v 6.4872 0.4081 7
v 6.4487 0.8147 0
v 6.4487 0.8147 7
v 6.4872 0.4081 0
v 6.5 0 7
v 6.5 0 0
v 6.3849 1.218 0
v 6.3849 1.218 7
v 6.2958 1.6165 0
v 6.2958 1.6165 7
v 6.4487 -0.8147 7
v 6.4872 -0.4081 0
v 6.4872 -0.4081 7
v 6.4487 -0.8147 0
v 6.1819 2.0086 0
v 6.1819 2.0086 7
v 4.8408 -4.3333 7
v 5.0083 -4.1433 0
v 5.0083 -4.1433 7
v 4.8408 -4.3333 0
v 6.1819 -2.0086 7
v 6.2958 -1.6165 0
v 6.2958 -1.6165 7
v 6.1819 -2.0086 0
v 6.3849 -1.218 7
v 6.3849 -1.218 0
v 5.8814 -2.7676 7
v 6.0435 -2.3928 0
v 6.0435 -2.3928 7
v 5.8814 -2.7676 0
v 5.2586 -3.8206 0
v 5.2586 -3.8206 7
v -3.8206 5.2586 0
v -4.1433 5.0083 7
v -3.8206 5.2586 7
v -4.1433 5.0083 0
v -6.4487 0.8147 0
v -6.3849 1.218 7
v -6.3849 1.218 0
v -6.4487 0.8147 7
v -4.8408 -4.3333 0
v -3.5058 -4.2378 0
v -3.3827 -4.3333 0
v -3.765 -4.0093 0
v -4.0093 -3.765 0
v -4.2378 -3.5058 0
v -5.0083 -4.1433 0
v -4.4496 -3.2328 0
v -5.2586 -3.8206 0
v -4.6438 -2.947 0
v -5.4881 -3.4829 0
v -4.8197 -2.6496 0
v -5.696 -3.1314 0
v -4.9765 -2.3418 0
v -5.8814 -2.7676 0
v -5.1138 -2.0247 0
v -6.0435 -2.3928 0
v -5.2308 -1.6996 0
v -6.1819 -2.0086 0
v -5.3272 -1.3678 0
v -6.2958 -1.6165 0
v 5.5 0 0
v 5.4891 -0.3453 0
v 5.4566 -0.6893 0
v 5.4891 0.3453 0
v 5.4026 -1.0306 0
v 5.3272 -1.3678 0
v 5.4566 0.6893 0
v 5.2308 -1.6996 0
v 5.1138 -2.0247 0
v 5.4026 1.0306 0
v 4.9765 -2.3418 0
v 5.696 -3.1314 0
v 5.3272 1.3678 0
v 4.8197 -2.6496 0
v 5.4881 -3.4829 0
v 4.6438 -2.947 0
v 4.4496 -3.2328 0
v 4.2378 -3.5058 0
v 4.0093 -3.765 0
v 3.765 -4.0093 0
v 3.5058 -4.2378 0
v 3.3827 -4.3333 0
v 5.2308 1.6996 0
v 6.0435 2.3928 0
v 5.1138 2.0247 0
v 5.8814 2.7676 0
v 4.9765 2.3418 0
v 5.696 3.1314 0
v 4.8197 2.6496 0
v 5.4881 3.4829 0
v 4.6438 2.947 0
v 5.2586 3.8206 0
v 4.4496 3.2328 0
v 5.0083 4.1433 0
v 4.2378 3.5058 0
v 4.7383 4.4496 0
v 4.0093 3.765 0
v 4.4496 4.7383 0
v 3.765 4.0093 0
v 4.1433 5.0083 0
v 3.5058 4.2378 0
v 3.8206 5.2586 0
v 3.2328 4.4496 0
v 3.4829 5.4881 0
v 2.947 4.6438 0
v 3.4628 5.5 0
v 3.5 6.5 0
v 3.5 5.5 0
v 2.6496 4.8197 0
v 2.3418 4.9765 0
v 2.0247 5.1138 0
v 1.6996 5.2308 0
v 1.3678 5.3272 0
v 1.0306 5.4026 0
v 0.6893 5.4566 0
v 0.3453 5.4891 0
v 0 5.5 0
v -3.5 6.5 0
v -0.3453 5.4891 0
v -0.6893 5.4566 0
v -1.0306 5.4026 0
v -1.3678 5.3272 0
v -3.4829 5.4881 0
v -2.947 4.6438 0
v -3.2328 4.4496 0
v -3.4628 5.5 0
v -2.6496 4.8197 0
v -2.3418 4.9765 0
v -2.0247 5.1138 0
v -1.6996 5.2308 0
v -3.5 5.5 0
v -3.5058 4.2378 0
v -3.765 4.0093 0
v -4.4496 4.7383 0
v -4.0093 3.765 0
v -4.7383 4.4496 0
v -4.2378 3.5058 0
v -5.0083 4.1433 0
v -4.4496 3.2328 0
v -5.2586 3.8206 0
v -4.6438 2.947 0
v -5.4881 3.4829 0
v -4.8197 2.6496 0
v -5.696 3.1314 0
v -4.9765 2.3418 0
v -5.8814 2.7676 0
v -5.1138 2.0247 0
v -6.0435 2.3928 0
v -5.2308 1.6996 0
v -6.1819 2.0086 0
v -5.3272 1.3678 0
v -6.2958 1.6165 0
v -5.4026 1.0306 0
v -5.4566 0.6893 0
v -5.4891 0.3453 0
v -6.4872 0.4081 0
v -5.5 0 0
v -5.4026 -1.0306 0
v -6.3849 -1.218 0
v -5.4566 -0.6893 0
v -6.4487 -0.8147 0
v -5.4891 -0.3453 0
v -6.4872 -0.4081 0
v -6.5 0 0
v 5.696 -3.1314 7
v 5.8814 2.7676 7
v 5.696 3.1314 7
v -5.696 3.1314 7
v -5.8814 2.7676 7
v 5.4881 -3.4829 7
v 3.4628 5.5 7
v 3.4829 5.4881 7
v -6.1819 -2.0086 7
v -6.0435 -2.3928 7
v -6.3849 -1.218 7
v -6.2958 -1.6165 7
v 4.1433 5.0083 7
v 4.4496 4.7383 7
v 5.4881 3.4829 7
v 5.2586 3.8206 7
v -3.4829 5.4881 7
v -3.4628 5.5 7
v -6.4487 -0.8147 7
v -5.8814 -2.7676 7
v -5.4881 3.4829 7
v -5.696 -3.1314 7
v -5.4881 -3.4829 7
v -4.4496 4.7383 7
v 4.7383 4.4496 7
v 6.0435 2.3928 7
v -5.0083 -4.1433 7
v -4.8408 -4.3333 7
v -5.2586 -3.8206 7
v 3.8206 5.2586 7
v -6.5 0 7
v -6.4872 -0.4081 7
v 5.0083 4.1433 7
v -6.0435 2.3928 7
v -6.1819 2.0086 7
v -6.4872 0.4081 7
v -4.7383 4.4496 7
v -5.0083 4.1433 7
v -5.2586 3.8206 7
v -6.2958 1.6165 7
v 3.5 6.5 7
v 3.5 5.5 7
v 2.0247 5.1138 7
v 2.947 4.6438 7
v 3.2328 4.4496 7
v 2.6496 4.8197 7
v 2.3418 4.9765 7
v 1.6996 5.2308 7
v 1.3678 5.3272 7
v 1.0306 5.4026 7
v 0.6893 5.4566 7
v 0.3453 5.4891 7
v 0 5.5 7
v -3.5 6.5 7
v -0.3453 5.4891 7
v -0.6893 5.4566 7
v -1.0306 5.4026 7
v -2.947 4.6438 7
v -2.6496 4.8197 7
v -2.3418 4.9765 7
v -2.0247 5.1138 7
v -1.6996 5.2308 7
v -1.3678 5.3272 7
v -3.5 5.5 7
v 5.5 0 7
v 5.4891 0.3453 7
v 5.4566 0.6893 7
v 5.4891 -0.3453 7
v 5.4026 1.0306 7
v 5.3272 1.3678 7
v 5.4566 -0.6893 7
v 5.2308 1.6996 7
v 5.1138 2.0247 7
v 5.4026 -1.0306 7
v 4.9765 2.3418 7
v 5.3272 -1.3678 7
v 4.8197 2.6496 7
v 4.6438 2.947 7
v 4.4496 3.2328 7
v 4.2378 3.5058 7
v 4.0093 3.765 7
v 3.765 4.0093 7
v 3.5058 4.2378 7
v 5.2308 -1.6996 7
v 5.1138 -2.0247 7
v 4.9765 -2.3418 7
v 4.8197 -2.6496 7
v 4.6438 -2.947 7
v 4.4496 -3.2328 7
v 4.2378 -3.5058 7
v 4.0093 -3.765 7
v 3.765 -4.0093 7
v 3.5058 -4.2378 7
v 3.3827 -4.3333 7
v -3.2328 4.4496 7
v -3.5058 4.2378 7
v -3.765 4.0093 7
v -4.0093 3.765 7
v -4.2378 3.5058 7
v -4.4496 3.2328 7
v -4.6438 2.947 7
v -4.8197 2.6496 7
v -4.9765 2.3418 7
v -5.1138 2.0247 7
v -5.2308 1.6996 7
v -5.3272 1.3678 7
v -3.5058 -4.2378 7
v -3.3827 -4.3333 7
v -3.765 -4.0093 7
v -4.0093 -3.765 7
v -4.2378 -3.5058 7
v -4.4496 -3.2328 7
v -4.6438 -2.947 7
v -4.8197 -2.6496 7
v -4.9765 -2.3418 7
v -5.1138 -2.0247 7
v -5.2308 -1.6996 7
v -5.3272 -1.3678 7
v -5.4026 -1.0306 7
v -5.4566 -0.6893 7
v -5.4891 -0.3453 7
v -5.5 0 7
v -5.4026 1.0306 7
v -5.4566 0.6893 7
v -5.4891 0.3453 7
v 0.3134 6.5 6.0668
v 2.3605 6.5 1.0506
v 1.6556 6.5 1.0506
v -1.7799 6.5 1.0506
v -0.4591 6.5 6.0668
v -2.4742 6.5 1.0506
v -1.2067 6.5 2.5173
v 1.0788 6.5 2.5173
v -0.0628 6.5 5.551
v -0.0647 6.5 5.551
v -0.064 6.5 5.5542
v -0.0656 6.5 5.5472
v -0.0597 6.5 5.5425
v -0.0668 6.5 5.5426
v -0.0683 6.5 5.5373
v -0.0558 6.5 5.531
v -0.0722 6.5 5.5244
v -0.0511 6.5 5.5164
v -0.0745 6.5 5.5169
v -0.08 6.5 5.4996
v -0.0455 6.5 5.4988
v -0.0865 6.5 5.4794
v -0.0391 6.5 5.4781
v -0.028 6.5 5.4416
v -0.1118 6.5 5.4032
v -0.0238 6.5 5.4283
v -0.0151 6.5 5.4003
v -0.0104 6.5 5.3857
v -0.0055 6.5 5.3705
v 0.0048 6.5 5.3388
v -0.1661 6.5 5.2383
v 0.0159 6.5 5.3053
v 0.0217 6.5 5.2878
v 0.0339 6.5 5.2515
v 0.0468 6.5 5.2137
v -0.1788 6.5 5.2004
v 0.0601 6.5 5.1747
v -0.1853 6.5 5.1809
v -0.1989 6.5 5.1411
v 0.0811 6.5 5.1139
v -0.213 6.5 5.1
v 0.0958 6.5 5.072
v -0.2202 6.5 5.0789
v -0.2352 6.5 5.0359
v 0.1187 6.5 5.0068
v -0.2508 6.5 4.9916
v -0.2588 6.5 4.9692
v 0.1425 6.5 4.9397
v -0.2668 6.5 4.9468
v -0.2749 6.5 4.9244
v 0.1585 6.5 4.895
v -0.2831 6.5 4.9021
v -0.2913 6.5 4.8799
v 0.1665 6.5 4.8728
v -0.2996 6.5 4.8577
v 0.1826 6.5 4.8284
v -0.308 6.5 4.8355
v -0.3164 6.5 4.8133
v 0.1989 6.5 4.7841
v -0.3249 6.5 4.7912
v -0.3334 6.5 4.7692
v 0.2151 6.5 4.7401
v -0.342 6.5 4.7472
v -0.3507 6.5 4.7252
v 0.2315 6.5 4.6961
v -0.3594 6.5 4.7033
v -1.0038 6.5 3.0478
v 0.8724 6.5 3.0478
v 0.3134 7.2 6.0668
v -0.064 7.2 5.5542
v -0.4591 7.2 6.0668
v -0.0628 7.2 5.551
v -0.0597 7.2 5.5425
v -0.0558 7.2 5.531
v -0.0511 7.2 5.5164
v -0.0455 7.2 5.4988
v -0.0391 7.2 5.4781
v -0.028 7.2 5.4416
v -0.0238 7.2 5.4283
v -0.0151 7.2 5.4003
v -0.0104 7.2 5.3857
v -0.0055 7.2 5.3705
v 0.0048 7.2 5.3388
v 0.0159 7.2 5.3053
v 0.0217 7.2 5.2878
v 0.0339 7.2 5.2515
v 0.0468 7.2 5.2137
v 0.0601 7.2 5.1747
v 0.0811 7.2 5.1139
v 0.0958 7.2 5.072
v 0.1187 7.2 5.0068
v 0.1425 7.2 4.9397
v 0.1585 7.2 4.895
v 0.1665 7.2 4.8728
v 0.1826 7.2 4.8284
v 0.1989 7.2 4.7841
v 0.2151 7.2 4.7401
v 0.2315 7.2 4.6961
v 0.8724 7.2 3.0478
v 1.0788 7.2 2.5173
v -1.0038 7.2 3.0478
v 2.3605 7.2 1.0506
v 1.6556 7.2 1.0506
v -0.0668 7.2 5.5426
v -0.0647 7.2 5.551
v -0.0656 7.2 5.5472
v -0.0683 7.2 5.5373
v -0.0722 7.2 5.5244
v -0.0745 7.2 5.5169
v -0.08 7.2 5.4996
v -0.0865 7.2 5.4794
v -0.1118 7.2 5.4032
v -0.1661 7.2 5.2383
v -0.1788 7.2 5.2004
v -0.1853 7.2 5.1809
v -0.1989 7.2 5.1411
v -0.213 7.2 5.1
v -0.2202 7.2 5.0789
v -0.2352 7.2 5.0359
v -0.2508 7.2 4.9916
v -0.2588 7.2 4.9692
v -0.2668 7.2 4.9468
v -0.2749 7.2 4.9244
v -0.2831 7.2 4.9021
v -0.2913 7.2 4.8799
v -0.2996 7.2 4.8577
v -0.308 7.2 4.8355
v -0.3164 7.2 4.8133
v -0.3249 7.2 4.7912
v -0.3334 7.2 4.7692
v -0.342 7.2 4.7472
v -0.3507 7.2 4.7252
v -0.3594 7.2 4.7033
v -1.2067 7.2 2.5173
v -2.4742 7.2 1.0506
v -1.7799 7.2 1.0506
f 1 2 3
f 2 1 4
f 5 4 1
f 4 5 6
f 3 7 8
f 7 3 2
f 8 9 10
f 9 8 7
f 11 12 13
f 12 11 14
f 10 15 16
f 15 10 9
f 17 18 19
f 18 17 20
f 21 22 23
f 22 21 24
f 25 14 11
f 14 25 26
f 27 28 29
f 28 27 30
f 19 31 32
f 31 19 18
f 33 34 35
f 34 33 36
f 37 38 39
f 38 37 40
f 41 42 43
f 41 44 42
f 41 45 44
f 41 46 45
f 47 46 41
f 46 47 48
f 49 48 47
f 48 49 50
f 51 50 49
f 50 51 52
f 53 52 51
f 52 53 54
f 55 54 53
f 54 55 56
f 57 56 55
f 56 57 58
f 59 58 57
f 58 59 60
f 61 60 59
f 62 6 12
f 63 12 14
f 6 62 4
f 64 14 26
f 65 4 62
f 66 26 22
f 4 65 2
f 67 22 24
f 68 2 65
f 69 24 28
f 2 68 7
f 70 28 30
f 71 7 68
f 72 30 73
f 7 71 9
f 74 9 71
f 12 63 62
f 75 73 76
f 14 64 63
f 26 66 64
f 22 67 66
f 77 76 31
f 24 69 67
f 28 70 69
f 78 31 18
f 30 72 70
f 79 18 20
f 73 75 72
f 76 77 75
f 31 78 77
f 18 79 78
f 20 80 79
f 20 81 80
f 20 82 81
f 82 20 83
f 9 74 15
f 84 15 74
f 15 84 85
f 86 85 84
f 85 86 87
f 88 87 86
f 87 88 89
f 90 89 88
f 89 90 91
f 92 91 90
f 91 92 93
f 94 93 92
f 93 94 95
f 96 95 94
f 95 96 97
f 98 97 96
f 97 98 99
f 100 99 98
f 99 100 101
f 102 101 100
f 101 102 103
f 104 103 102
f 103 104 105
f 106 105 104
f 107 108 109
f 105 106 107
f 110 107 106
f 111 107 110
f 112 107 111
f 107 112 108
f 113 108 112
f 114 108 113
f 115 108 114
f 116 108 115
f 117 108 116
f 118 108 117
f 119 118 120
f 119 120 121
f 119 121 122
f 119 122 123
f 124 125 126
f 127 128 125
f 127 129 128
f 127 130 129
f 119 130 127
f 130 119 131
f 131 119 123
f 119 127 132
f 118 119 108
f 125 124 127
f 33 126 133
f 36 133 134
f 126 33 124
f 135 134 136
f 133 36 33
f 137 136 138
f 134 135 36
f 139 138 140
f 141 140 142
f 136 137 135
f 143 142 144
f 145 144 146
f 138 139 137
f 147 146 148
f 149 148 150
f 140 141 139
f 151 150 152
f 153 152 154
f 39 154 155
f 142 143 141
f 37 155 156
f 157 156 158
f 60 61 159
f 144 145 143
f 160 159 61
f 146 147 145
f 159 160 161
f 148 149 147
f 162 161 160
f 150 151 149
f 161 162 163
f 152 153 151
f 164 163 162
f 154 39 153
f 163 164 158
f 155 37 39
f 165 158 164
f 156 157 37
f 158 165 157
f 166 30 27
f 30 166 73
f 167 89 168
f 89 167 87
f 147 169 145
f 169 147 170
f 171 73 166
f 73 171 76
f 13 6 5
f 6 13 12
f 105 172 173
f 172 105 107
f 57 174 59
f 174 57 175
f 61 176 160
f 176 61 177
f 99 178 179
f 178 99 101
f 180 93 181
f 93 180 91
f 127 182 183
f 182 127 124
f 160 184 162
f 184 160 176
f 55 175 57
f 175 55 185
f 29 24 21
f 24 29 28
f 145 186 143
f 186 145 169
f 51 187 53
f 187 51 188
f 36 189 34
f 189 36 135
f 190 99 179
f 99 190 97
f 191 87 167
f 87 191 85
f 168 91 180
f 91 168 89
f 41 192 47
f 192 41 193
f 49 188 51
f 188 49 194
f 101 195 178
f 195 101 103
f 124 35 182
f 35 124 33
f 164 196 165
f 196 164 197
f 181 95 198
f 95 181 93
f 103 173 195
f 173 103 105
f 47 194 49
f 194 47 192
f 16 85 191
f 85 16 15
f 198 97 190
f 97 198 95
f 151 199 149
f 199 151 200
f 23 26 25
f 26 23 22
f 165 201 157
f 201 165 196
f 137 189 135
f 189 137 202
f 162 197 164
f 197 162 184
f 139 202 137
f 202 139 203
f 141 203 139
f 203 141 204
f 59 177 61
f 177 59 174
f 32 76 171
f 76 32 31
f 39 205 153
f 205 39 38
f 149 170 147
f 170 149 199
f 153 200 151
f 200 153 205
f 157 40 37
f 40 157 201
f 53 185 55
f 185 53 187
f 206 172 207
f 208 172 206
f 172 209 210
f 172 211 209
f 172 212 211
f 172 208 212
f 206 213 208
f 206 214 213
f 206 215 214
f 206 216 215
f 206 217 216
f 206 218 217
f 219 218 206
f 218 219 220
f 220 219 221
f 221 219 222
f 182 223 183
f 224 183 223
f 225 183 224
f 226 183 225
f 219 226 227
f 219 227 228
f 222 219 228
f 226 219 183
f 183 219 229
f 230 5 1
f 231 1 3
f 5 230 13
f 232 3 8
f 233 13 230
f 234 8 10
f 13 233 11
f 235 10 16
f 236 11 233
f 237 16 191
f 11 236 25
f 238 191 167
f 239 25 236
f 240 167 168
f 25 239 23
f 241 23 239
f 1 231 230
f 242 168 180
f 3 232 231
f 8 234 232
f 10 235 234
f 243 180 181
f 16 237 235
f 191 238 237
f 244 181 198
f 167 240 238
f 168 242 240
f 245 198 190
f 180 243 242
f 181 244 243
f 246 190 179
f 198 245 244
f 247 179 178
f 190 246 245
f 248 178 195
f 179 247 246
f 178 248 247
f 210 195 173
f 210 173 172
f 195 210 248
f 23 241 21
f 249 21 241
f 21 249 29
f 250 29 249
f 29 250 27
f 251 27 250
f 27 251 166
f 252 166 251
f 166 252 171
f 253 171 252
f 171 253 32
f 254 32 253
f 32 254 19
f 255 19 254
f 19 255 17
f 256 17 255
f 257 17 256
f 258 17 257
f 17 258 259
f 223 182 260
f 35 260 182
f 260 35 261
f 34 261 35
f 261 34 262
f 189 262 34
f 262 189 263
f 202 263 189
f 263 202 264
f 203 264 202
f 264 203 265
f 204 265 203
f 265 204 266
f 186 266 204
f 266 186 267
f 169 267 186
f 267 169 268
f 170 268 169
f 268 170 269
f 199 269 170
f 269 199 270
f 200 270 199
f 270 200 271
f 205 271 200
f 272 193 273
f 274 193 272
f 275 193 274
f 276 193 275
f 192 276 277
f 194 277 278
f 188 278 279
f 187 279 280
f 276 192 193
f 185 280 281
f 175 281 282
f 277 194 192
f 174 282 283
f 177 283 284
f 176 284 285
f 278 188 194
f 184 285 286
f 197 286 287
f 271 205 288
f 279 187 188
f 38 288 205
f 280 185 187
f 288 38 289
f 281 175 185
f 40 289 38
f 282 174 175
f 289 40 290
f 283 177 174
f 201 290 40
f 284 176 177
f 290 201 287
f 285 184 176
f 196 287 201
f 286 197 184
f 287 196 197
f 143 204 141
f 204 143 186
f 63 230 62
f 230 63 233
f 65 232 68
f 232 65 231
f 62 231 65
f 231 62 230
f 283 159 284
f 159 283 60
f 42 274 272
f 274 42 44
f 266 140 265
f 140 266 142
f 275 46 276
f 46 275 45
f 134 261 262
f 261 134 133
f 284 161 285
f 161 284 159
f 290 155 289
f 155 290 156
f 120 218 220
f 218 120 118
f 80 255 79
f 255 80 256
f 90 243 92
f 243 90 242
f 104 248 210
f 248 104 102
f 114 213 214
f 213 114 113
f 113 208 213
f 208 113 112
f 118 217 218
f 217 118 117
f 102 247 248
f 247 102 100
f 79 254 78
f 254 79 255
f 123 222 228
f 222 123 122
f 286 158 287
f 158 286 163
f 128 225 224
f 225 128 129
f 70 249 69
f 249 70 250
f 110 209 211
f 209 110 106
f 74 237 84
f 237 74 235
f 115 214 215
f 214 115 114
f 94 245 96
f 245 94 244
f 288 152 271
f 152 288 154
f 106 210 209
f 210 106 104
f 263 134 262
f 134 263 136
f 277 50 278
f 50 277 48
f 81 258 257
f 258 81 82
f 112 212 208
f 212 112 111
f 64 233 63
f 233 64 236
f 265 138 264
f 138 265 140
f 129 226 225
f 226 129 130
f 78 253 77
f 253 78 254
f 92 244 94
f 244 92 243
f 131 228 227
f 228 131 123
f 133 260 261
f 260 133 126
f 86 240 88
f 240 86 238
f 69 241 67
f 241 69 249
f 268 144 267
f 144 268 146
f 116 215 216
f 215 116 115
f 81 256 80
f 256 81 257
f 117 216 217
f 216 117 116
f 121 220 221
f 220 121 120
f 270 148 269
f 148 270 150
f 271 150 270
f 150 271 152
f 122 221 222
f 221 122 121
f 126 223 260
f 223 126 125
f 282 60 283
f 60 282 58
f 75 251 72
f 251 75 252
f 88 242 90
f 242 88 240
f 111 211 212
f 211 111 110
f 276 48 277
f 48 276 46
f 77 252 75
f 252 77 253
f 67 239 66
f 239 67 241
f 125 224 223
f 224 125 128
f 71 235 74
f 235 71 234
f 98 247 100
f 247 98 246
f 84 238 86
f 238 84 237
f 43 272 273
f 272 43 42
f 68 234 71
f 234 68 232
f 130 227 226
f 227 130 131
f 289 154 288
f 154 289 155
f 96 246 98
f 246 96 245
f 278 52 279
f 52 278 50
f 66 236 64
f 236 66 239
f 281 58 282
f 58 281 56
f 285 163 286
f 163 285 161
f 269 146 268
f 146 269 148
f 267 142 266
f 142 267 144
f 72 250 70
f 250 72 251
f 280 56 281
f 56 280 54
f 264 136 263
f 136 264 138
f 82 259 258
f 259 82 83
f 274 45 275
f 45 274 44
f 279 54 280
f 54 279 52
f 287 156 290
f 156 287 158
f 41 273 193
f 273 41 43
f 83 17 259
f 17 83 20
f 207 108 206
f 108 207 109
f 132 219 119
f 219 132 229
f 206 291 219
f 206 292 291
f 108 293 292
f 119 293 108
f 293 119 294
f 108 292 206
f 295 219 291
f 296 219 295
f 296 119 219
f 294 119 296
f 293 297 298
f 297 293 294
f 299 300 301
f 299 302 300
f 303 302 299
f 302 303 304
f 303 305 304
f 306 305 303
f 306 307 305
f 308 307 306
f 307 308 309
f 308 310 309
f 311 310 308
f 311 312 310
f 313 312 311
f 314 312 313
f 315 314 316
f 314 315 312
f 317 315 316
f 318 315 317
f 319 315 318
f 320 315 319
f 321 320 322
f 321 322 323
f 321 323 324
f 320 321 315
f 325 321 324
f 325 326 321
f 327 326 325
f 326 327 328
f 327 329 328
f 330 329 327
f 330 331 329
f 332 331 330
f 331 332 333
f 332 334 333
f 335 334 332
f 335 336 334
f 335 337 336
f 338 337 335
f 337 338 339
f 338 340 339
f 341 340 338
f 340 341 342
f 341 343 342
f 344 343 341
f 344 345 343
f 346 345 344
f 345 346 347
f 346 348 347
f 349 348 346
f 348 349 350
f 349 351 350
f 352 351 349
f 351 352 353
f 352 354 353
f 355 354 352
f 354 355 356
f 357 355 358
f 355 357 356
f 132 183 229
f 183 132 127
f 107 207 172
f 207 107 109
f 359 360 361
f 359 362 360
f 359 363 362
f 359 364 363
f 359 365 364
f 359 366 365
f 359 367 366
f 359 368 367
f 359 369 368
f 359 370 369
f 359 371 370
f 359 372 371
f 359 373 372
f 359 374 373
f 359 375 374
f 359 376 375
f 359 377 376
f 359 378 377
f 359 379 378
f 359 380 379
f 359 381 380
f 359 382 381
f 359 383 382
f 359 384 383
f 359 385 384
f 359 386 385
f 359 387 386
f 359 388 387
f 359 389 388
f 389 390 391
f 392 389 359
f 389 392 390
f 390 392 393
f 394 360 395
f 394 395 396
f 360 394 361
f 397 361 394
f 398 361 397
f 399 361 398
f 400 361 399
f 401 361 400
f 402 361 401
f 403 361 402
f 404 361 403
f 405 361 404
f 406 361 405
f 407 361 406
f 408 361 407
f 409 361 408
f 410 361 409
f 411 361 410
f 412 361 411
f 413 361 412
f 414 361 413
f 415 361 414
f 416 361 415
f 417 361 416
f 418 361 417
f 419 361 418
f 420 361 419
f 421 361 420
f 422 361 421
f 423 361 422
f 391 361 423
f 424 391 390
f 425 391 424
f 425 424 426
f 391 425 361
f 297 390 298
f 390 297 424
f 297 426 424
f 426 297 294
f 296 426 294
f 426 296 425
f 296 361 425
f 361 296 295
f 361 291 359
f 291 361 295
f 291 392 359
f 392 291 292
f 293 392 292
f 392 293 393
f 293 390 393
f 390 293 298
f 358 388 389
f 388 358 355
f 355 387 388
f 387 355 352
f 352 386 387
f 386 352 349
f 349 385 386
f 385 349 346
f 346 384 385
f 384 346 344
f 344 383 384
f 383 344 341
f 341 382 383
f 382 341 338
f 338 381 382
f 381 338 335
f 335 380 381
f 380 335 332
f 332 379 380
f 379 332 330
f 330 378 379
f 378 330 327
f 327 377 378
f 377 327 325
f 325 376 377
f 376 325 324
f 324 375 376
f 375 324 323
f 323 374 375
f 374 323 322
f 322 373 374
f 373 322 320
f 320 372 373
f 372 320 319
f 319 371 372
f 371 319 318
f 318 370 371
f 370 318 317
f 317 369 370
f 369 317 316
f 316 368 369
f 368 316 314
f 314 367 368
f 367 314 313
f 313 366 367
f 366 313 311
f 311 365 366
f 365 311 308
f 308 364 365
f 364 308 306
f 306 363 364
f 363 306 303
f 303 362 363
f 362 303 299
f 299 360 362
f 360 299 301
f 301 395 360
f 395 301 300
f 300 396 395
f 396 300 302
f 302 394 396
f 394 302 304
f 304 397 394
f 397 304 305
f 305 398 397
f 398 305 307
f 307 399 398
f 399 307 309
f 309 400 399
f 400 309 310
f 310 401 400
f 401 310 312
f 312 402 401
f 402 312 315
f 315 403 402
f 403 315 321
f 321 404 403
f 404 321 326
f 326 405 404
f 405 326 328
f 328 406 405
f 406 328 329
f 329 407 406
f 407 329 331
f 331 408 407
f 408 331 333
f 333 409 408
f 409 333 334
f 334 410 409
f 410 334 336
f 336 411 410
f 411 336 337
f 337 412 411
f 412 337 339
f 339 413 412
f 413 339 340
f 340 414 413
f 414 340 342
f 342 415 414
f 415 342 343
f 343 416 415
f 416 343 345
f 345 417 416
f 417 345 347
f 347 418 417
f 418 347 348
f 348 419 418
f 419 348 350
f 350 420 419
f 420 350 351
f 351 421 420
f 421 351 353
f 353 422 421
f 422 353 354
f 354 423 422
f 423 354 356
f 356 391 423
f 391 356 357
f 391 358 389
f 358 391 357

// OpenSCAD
// preview[view:north west, tilt:top diagonal]

// The text of the tag. One char recommended.
text = "A";
// The width of the tag. Change this, if you use larger text.
width = 7;

/* [Hidden] */

d = 13;
h = 7;
t = 1;

$fn = 100;

difference() {
    cylinder(r=d/2,h=h);
    translate([0,0,-5])cylinder(r=d/2-t,h=h+10);
    translate([-50,-50-d/3,-5]) cube([100,50,h+10]);
}
translate([-width/2,d/2-t,0]) {
    cube([width,1,h]);    
}

translate([0,d/2+0.7,h/2])
    rotate([90,0,0])
    mirror([1,0,0])
    linear_extrude(height = 1) {
        text(text = text, font = "Liberation Sans", size = h*3/4, valign = "center", halign="center");
    }
